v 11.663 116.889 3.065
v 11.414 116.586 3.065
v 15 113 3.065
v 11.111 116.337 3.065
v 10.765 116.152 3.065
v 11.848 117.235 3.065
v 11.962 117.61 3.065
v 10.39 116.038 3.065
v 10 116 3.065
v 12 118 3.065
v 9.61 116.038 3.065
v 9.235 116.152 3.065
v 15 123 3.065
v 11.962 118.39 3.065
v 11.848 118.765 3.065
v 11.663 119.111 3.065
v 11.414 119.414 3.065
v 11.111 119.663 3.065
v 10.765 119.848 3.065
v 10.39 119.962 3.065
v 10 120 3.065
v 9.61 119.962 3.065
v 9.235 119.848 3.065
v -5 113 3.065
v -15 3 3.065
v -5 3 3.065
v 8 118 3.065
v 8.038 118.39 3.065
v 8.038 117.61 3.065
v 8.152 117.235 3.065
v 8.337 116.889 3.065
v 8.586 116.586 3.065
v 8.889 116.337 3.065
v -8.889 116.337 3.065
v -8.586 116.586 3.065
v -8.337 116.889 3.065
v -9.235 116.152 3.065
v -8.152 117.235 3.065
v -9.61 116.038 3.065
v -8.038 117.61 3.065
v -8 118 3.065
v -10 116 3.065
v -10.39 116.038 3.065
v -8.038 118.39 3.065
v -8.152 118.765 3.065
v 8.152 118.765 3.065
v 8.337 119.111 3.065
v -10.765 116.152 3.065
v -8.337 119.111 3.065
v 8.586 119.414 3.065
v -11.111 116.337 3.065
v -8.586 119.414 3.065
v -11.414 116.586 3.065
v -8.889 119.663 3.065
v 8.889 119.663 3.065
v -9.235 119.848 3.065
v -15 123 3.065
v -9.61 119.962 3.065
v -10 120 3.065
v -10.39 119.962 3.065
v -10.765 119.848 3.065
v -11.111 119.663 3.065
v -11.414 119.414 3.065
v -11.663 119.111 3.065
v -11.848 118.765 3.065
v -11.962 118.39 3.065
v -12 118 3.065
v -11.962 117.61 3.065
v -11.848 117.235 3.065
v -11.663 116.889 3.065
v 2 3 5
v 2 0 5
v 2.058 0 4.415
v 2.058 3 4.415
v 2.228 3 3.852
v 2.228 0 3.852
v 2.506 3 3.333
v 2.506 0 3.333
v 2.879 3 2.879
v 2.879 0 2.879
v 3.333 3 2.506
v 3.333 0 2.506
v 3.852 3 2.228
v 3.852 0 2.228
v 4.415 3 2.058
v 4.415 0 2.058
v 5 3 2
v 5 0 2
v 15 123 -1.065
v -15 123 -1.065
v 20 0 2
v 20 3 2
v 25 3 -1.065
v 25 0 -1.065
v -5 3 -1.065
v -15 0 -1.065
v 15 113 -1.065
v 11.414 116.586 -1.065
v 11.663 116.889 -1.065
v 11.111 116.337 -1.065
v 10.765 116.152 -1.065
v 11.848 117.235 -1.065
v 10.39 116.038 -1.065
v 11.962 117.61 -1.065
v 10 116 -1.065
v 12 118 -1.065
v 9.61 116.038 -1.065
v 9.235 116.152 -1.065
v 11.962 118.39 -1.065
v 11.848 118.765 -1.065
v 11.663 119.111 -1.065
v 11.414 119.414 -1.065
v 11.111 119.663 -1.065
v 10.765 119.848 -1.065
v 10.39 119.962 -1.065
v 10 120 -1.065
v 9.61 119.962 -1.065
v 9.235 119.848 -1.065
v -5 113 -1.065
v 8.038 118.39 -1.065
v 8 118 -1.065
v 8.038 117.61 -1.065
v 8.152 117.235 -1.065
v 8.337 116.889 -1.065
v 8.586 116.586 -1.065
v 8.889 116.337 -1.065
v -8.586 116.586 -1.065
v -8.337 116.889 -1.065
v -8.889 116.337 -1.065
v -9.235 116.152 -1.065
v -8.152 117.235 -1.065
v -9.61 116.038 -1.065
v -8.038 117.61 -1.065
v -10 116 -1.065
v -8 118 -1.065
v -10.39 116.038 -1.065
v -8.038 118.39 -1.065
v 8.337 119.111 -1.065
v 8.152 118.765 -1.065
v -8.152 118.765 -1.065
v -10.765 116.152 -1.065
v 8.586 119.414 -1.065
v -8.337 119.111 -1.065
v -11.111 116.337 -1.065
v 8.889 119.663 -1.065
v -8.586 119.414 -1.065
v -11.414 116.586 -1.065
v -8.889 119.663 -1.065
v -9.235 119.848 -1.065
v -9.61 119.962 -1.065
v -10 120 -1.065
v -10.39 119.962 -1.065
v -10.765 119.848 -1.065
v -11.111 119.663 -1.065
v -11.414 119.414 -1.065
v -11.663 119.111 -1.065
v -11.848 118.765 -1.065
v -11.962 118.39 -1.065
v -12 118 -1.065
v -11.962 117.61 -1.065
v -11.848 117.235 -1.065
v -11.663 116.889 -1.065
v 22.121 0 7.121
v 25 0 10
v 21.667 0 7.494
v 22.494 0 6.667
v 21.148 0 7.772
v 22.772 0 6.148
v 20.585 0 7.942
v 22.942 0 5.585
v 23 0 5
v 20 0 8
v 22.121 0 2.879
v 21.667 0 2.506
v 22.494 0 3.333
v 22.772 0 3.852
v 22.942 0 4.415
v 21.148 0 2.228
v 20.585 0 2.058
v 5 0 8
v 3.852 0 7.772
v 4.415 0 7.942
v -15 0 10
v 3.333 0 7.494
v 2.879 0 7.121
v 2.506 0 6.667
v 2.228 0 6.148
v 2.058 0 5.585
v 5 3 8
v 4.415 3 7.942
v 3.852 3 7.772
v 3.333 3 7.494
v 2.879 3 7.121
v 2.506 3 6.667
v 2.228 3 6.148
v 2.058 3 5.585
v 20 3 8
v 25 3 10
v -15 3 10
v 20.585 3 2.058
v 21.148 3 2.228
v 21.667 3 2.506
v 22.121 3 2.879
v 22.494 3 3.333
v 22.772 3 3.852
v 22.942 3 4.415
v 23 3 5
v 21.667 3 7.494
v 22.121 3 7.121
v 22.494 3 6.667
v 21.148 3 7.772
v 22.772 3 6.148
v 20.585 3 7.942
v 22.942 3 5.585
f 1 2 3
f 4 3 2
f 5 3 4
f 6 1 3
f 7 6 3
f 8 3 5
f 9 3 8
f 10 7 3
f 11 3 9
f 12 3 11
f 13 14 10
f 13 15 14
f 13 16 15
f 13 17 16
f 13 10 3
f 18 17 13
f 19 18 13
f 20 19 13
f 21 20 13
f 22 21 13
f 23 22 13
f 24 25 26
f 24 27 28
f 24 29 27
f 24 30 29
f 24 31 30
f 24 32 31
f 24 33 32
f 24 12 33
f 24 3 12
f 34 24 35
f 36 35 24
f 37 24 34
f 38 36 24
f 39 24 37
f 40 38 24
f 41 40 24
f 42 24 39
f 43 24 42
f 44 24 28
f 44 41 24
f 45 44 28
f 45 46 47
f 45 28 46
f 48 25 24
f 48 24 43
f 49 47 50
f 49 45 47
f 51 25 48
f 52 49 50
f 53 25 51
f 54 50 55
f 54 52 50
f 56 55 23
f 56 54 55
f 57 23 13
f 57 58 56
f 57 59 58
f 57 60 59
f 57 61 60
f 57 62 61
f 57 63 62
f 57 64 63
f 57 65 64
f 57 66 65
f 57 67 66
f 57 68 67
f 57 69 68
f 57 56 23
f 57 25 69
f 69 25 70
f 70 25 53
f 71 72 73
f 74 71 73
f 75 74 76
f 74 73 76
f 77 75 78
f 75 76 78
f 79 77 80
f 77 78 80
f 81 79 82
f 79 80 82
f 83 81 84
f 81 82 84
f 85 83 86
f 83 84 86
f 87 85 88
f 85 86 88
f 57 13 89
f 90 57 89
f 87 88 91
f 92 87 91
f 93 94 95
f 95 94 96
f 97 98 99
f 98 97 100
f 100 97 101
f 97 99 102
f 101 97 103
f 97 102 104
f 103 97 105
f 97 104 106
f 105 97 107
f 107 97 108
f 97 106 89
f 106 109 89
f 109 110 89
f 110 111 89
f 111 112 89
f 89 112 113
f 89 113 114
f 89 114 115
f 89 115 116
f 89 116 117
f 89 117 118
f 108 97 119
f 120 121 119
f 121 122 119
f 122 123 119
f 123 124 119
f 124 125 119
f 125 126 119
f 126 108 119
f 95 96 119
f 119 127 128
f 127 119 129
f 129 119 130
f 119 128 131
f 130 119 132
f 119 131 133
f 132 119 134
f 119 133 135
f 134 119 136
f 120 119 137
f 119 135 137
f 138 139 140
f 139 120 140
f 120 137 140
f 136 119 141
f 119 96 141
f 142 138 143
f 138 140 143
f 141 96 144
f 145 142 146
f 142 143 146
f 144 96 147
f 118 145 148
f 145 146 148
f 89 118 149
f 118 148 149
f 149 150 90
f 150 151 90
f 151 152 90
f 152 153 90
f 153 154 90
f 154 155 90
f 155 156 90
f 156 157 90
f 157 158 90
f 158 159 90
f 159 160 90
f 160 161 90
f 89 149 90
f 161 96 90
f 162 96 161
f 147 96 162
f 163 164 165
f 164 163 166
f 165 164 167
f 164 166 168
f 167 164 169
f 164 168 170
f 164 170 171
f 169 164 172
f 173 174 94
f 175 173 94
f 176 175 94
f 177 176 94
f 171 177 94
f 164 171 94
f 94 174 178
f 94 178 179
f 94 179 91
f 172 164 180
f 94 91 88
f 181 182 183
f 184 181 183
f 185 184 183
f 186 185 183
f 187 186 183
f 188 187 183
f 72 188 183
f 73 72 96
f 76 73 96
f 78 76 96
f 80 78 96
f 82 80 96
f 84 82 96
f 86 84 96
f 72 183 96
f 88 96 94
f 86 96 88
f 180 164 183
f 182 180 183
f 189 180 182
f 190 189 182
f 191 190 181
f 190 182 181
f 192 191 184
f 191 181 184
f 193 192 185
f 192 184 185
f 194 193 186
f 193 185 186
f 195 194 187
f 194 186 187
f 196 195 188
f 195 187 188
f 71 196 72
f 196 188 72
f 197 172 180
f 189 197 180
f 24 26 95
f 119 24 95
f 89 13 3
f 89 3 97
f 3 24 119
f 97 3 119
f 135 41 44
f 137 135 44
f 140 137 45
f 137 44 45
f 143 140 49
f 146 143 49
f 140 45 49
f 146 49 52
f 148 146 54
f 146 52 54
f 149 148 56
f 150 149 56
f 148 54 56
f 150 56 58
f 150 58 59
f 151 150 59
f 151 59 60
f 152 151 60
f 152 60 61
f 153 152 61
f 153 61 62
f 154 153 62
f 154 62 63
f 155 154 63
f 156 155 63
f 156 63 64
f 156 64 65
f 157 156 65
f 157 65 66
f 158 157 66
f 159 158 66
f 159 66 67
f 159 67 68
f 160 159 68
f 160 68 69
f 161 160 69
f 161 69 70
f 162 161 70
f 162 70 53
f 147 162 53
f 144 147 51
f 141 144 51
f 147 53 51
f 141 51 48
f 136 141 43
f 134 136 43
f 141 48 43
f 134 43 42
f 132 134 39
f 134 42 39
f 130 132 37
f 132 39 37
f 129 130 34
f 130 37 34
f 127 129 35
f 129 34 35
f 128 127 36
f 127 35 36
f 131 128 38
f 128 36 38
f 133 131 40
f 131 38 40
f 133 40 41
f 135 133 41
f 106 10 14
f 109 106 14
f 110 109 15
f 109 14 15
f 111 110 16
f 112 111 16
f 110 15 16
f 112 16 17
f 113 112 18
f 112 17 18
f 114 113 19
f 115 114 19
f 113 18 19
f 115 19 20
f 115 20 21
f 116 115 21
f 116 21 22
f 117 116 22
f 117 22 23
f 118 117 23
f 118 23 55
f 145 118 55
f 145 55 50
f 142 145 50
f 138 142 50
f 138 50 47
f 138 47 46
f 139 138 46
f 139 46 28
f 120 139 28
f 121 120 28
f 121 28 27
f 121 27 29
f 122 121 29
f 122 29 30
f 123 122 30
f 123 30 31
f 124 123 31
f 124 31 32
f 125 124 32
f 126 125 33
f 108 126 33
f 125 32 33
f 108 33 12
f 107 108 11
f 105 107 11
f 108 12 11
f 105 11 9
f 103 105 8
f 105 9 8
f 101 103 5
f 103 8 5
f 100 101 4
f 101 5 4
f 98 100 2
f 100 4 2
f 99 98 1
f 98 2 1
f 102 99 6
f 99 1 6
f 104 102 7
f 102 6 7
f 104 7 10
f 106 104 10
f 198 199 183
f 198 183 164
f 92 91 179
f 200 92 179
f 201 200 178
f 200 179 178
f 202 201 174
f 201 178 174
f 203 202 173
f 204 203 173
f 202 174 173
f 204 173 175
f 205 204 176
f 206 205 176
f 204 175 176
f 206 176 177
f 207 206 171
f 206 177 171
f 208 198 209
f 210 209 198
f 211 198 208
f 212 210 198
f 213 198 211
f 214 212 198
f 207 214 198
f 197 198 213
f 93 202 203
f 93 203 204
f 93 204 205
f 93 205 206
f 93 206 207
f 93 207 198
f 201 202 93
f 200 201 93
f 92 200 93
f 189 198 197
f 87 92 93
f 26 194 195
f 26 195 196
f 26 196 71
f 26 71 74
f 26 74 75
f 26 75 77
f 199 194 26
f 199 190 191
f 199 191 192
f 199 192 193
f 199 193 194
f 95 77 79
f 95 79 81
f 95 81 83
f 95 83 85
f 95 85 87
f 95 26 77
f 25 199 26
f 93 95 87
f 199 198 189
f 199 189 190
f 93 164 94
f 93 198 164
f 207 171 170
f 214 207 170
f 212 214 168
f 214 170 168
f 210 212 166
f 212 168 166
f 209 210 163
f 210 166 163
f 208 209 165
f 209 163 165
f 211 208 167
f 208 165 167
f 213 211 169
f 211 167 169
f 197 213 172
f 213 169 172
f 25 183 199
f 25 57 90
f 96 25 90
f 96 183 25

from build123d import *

# Parameters (mm, degrees)
EXTRUDE_1_DEPTH      = 3
SKETCH_4_W           = 15
SKETCH_4_H           = 10
EXTRUDE_3_DEPTH      = 3
SKETCH_5_W           = 10
SKETCH_5_H           = 4.129403984
EXTRUDE_4_DEPTH      = 120
EXTRUDE_4_DEPTH_BACK = 3
SKETCH_6_R           = 2
CUT_EXTRUDE_2_DEPTH  = 5.129403983
SKETCH_7_W           = 1.064701992
SKETCH_7_H           = 3
EXTRUDE_5_DEPTH      = 30
SKETCH_8_W           = 4.129403984
SKETCH_8_H           = 10
EXTRUDE_6_DEPTH      = 20
SKETCH_9_R           = 2
CUT_EXTRUDE_3_DEPTH  = 5.129403983


with BuildPart() as part:
    # 草图1 → 凸台-拉伸1 (new body)
    with BuildSketch(Plane(origin=(0, 0, 0), x_dir=(1, 0, 0), z_dir=(0, 1, 0))):
        with BuildLine():
            Line((25, 0), (0, 0))
            Line((0, 0), (0, -5))
            Line((0, -5), (2, -5))
            ThreePointArc((2, -5), (2.878679656, -2.878679656), (5, -2))
            Line((5, -2), (20, -2))
            ThreePointArc((20, -2), (22.121320344, -2.878679656), (23, -5))
            Line((23, -5), (25, -5))
            Line((25, -5), (25, 0))
        make_face()
        with BuildLine():
            Line((2, -5), (0, -5))
            Line((0, -5), (0, -10))
            Line((0, -10), (25, -10))
            Line((25, -10), (25, -5))
            Line((25, -5), (23, -5))
            ThreePointArc((23, -5), (22.121320344, -7.121320344), (20, -8))
            Line((20, -8), (5, -8))
            ThreePointArc((5, -8), (2.878679656, -7.121320344), (2, -5))
        make_face()
    extrude(amount=EXTRUDE_1_DEPTH)

    # 草图4 → 凸台-拉伸3 (add)
    with BuildSketch(Plane(origin=(0, 3, 0), x_dir=(1, 0, 0), z_dir=(0, 1, 0))):
        with Locations((-7.5, -5)):
            Rectangle(SKETCH_4_W, SKETCH_4_H)
    extrude(amount=-EXTRUDE_3_DEPTH)

    # 草图5 → 凸台-拉伸4 (add, two sides)
    with BuildSketch(Plane(origin=(0, 3, 0), x_dir=(1, 0, 0), z_dir=(0, 1, 0))) as extrude_4_sk:
        with Locations((-10, -1)):
            Rectangle(SKETCH_5_W, SKETCH_5_H)
    extrude(amount=EXTRUDE_4_DEPTH)
    extrude(extrude_4_sk.sketch, amount=-EXTRUDE_4_DEPTH_BACK)

    # 草图6 → 切除-拉伸2 (cut, through all)
    with BuildSketch(Plane.XY.offset(3.064701992)):
        with Locations((-10, 118)):
            Circle(SKETCH_6_R)
    extrude(amount=-CUT_EXTRUDE_2_DEPTH, mode=Mode.SUBTRACT)

    # 草图7 → 凸台-拉伸5 (add, through all)
    with BuildSketch(Plane(origin=(-5, 0, 0), x_dir=(0, 0, -1), z_dir=(1, 0, 0))):
        with Locations((0.532350996, 1.5)):
            Rectangle(SKETCH_7_W, SKETCH_7_H)
    extrude(amount=EXTRUDE_5_DEPTH)

    # 草图8 → 凸台-拉伸6 (add)
    with BuildSketch(Plane(origin=(-5, 0, 0), x_dir=(0, 0, -1), z_dir=(1, 0, 0))):
        with Locations((-1, 118)):
            Rectangle(SKETCH_8_W, SKETCH_8_H)
    extrude(amount=EXTRUDE_6_DEPTH)

    # 草图9 → 切除-拉伸3 (cut, through all)
    with BuildSketch(Plane.XY.offset(3.064701992)):
        with Locations((10, 118)):
            Circle(SKETCH_9_R)
    extrude(amount=-CUT_EXTRUDE_3_DEPTH, mode=Mode.SUBTRACT)


solid = part.part
